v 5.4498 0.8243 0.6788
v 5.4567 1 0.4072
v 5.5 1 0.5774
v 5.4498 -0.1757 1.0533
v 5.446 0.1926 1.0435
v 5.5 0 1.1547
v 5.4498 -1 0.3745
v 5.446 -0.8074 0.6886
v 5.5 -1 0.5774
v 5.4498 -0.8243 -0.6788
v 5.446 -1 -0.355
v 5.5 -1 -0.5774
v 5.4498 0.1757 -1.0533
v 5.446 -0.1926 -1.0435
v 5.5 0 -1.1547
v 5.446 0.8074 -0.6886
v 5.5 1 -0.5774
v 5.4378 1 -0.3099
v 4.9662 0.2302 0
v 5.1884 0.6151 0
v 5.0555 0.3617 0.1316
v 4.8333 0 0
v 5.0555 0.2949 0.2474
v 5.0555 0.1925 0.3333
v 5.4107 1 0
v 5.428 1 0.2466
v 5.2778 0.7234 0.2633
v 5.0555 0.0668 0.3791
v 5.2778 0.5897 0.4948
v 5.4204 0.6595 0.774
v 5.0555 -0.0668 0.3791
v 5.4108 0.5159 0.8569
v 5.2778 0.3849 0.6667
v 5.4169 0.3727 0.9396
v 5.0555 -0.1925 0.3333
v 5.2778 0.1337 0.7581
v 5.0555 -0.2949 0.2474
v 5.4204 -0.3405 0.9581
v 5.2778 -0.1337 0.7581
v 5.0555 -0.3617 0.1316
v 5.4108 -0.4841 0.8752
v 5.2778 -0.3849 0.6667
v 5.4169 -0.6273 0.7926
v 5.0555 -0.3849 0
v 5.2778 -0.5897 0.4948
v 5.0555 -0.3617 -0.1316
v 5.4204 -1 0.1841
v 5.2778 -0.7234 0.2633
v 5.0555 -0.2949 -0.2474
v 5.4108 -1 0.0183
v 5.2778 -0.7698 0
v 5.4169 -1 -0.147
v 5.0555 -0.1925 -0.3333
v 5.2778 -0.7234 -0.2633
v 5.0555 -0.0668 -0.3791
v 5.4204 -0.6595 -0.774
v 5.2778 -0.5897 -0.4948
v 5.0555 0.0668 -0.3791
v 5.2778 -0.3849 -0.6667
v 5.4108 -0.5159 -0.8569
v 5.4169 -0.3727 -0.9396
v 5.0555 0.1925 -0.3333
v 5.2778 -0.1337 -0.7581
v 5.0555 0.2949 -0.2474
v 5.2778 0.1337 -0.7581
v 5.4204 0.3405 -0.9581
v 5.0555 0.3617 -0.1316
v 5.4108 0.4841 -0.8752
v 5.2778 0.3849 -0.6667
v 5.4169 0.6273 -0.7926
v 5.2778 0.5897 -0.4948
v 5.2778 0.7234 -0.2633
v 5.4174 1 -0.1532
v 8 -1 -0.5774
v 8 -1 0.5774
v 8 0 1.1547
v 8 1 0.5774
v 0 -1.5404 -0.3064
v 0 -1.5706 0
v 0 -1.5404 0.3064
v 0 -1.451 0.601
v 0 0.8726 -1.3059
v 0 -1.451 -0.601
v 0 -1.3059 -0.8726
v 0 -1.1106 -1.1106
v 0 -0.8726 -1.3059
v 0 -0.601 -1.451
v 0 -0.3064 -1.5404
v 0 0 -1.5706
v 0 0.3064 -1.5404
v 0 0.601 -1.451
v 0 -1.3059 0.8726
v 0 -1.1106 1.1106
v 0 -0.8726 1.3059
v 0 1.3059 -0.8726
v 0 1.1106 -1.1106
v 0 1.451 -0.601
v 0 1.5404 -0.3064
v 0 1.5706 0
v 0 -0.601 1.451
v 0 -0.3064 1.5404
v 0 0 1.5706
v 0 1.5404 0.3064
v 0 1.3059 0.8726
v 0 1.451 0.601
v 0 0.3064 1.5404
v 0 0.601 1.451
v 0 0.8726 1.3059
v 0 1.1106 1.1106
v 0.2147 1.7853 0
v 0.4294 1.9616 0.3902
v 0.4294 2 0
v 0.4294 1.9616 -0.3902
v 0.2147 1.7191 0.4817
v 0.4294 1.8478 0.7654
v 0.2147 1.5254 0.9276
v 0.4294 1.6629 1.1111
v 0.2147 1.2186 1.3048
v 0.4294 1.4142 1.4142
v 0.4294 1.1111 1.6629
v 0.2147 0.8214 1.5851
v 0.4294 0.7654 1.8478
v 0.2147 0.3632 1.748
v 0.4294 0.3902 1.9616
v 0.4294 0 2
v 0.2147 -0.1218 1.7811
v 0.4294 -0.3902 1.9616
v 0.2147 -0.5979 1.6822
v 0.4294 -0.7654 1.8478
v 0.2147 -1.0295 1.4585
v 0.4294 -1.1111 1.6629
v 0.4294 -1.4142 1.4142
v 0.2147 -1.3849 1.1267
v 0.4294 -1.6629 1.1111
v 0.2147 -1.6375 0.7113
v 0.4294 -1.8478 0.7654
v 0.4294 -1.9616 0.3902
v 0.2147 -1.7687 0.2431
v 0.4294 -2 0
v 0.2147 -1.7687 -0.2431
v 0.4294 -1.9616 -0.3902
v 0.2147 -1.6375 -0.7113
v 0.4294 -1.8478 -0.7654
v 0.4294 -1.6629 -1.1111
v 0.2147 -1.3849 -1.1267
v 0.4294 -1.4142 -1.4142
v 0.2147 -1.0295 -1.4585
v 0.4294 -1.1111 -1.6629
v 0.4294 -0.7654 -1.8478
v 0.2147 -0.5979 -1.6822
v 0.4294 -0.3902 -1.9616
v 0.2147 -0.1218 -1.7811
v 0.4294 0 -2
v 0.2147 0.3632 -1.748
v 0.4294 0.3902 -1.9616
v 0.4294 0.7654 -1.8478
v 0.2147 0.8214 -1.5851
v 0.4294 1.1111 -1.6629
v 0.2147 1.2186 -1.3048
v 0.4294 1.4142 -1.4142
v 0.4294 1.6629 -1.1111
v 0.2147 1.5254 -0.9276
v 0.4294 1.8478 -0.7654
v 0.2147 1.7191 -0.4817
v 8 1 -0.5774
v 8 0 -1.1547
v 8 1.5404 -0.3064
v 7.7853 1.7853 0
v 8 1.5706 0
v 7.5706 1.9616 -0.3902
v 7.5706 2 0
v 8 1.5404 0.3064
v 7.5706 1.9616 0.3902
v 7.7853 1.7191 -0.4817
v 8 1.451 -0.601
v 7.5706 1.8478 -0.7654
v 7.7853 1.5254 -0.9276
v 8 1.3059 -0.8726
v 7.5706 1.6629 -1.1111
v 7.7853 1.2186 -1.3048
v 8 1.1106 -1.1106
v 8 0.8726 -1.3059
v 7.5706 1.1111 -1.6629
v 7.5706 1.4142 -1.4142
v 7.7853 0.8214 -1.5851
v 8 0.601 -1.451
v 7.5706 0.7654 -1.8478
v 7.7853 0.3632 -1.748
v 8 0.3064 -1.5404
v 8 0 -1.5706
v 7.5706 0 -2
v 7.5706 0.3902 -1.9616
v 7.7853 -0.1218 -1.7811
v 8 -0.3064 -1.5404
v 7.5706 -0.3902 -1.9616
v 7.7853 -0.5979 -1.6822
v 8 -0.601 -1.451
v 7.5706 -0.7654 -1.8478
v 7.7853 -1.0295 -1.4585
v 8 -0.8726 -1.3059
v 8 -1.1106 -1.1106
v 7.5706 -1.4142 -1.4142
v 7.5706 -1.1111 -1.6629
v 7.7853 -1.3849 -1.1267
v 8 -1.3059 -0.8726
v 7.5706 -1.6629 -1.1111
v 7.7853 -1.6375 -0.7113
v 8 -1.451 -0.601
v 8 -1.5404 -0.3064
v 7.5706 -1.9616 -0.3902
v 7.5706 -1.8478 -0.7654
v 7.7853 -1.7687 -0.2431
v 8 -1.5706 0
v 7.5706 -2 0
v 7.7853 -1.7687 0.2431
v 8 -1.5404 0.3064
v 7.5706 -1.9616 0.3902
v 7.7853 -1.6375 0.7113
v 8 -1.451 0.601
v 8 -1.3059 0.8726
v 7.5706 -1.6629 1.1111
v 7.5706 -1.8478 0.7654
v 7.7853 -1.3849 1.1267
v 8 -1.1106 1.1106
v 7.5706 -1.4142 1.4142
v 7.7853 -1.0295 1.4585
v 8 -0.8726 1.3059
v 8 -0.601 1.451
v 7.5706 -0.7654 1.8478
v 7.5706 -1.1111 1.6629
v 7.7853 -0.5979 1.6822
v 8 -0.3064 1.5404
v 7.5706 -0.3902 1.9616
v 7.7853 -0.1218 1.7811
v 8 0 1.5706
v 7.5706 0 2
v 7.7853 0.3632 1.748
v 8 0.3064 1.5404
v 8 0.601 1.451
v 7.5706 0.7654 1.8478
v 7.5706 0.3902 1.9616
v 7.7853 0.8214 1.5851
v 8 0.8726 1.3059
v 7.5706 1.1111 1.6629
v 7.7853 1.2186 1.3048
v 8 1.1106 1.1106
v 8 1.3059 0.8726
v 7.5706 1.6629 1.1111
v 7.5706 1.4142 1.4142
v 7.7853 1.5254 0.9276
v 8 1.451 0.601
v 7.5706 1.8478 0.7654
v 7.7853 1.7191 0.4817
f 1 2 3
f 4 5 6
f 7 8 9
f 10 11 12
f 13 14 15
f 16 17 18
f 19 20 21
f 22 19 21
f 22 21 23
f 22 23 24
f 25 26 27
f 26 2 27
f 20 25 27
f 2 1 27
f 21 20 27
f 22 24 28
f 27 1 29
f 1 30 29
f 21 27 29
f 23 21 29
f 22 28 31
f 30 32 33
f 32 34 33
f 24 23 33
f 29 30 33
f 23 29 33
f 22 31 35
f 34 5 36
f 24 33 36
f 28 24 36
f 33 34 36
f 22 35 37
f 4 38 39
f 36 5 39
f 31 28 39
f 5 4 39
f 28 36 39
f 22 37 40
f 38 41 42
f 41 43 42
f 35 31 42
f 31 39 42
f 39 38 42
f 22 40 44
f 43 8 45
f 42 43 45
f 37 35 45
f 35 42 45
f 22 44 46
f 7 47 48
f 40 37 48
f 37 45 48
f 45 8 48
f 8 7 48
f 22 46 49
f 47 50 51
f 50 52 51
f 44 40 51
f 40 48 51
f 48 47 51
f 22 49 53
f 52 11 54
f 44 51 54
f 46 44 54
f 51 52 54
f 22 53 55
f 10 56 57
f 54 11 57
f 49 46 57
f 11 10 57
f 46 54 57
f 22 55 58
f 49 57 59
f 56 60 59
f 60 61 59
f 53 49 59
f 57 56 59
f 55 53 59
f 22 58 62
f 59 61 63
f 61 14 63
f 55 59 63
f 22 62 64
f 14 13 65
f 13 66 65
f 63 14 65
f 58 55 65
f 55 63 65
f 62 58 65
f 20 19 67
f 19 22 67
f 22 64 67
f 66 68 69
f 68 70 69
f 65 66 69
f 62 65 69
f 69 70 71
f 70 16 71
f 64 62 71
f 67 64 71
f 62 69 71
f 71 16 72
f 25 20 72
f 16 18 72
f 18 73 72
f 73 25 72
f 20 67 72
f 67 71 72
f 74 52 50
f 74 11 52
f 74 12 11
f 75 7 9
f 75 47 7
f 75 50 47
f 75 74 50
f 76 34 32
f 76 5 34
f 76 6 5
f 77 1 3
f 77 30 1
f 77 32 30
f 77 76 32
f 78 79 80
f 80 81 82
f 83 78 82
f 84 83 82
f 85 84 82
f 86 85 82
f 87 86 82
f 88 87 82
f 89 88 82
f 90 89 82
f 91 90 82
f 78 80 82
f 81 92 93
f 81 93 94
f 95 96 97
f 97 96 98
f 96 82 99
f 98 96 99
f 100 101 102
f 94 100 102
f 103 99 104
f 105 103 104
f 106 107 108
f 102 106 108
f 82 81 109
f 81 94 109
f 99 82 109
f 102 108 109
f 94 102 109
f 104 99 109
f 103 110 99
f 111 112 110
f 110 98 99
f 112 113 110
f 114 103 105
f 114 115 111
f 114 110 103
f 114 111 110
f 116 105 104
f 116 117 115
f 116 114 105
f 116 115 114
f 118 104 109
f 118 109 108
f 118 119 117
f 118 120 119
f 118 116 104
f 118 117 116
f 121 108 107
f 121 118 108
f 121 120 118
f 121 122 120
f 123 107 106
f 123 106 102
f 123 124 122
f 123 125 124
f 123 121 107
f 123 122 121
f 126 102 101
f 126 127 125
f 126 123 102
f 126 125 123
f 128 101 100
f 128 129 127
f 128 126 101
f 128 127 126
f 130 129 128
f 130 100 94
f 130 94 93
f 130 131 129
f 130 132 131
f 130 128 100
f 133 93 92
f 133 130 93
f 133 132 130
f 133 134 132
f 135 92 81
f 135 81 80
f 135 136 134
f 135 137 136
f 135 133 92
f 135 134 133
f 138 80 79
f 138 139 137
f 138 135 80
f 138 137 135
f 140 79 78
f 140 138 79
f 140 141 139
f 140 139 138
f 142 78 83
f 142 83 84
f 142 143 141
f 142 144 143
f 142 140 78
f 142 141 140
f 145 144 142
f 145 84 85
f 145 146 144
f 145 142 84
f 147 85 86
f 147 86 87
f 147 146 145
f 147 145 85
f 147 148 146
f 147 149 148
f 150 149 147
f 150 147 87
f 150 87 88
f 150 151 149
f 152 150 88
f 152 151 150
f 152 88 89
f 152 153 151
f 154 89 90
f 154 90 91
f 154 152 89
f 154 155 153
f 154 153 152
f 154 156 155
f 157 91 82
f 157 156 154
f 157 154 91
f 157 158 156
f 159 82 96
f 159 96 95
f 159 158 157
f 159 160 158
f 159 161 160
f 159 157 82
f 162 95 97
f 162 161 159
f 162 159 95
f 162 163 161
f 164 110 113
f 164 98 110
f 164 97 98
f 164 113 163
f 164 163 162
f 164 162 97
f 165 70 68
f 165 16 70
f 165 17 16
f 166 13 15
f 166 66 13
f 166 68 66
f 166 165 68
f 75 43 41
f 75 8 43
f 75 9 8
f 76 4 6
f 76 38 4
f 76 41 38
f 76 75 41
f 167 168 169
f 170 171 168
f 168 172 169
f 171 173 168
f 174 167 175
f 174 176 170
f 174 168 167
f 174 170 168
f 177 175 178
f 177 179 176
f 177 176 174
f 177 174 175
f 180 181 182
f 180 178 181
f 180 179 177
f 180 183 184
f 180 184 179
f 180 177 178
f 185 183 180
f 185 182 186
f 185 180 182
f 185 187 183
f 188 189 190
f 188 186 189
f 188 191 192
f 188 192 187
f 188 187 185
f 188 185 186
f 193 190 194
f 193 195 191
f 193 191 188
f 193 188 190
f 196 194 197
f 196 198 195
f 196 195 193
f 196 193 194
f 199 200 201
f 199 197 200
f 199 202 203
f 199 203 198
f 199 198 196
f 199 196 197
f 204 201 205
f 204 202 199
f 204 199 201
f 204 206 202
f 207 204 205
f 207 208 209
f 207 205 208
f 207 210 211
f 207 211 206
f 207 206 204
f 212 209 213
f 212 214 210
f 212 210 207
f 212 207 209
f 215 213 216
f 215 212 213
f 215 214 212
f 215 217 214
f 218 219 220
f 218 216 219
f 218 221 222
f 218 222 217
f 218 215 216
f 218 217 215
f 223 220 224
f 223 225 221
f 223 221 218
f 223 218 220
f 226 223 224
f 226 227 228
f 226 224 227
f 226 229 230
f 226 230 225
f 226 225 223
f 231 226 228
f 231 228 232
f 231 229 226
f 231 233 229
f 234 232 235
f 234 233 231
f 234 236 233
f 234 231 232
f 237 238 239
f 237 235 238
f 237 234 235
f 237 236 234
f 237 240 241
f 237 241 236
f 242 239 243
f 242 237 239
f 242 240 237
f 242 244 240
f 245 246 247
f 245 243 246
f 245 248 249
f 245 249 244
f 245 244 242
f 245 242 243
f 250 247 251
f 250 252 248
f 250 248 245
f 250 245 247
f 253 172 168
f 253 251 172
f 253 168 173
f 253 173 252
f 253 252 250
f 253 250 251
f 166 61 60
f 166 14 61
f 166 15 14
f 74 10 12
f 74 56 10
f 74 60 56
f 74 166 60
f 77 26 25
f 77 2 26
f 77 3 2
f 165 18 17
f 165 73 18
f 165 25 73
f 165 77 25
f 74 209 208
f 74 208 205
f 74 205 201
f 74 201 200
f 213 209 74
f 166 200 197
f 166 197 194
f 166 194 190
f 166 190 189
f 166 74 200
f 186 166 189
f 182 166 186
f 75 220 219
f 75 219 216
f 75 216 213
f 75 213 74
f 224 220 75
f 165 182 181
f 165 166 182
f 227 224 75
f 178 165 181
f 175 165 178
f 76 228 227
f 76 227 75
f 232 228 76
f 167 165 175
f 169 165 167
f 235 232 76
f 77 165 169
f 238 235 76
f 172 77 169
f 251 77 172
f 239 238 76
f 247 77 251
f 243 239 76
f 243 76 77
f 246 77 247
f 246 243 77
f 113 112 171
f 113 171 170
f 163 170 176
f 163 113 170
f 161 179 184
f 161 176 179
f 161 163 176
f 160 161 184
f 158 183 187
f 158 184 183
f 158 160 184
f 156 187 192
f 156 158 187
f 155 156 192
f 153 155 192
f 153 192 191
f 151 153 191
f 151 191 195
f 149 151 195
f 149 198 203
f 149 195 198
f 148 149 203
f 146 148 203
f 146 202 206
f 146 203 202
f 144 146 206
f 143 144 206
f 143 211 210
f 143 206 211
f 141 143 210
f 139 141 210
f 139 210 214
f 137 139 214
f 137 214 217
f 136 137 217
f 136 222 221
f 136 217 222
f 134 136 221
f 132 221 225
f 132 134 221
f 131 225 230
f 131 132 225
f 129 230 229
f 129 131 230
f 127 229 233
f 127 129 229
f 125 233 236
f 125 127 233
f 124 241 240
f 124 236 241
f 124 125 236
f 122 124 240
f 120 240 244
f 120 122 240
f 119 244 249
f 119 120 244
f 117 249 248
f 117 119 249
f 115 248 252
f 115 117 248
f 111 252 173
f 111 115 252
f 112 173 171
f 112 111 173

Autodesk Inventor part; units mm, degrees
ref_plane "YZ Plane" through (0, 0, 0) normal (1, 0, 0) x (0, 1, 0)
ref_plane "XZ Plane" through (0, 0, 0) normal (0, 1, 0) x (-1, 0, 0)
sketch "Sketch1" plane through (0, 0, 0) normal (0, 0, 1) x (1, 0, 0)
  line L0 (0, 0) -> (4.8333, 0)
  line L1 (8, 1.1547) -> (8, 2)
  line L2 (8, 2) -> (0, 2)
  line L3 (8, 1.1547) -> (5.5, 1.1547)
  line L4 (5.5, 1.1547) -> (4.8333, 0)
  line L5 (0, -0.4) -> (0, 2.4) projected
  line L6 (0, 2) -> (0, 0)
  dimension "d0" = 2.5
  dimension "d1" = 60
  dimension "d2" = 4
  dimension "d3" = 2.3094
  dimension "d5" = 8
revolve "Body" add sketch "Sketch1" angle 360 about axis through (0, 0, 0) along (1, 0, 0)
chamfer "Chamfer1" distance 0.4294 angle 45 1 edges at (8, -2, 0) measured on face at (8, 1.6877, -0.2517)
sketch "Sketch2" plane through (8, 0, 0) normal (1, 0, 0) x (0, 0, -1)
  circle A0 centre (0, 0) radius 1.1547 projected
  line L0 (-0.5774, 1) -> (0.5774, 1)
  line L1 (0.5774, 1) -> (1.1547, 0)
  line L2 (1.1547, 0) -> (0.5774, -1)
  line L3 (0.5774, -1) -> (-0.5774, -1)
  line L4 (-0.5774, -1) -> (-1.1547, 0)
  line L5 (-1.1547, 0) -> (-0.5774, 1)
extrude "Slot" add sketch "Sketch2" against normal up to next contours L1 A0 | A0 L2 | L0 A0 | A0 L3 | L5 A0 | A0 L4
thread "Thread" size "M4x0.7" class "6g" standard "ISO Metric profile" length 8
chamfer "Chamfer2" distance 0.4294 angle 45 1 edges at (0, -2, 0) measured on face at (2.5235, 1.9935, -0.1609)
ref_plane "Work Plane1" through (4, 0, 0) normal (0, 0.5, 0.866) x (1, 0, 0)
equation "\"d0\" = INTI"
equation "\"d2\" = NND"
equation "\"d3\" = 1.1547 * SW"
equation "\"d5\" = NLG"
equation "\"d7\" = -0.5 * GD1 + 0.5 * NND"
equation "\"d8\" = FAWI"
equation "\"d29\" = -0.5 * GD1 + 0.5 * NND"
equation "\"d11\" = NLG"
equation "\"d13\" = -0.5 * GD1 + 0.5 * NND"
equation "\"d14\" = FAWI"
equation "\"d30\" = -0.5 * GD1 + 0.5 * NND"
equation "\"NND\" = 4"
equation "\"NLG\" = 8"
equation "\"INTI\" = 2.5"
equation "\"FAWI\" = 45deg"
equation "\"SW\" = 2"
equation "\"GD1\" = THREADDIA - 1.2269 * PTC"
equation "\"FAWI1\" = 45deg"
equation "\"GUL\" = 0.61345 * PTC"
equation "\"SPD\" = 2.5"
equation "\"SEWI\" = 90deg"
equation "\"TOA\" = 30deg"
equation "\"THREADDIA\" = 4"
equation "\"PTC\" = 0.7"
equation "\"GAL\" = 0.61345 * PTC"
equation "\"E0\" = 1.155 * SW"
properties part number "ISO 4026 - M4 x 8(1)" material "Stainless Steel, 440C"
